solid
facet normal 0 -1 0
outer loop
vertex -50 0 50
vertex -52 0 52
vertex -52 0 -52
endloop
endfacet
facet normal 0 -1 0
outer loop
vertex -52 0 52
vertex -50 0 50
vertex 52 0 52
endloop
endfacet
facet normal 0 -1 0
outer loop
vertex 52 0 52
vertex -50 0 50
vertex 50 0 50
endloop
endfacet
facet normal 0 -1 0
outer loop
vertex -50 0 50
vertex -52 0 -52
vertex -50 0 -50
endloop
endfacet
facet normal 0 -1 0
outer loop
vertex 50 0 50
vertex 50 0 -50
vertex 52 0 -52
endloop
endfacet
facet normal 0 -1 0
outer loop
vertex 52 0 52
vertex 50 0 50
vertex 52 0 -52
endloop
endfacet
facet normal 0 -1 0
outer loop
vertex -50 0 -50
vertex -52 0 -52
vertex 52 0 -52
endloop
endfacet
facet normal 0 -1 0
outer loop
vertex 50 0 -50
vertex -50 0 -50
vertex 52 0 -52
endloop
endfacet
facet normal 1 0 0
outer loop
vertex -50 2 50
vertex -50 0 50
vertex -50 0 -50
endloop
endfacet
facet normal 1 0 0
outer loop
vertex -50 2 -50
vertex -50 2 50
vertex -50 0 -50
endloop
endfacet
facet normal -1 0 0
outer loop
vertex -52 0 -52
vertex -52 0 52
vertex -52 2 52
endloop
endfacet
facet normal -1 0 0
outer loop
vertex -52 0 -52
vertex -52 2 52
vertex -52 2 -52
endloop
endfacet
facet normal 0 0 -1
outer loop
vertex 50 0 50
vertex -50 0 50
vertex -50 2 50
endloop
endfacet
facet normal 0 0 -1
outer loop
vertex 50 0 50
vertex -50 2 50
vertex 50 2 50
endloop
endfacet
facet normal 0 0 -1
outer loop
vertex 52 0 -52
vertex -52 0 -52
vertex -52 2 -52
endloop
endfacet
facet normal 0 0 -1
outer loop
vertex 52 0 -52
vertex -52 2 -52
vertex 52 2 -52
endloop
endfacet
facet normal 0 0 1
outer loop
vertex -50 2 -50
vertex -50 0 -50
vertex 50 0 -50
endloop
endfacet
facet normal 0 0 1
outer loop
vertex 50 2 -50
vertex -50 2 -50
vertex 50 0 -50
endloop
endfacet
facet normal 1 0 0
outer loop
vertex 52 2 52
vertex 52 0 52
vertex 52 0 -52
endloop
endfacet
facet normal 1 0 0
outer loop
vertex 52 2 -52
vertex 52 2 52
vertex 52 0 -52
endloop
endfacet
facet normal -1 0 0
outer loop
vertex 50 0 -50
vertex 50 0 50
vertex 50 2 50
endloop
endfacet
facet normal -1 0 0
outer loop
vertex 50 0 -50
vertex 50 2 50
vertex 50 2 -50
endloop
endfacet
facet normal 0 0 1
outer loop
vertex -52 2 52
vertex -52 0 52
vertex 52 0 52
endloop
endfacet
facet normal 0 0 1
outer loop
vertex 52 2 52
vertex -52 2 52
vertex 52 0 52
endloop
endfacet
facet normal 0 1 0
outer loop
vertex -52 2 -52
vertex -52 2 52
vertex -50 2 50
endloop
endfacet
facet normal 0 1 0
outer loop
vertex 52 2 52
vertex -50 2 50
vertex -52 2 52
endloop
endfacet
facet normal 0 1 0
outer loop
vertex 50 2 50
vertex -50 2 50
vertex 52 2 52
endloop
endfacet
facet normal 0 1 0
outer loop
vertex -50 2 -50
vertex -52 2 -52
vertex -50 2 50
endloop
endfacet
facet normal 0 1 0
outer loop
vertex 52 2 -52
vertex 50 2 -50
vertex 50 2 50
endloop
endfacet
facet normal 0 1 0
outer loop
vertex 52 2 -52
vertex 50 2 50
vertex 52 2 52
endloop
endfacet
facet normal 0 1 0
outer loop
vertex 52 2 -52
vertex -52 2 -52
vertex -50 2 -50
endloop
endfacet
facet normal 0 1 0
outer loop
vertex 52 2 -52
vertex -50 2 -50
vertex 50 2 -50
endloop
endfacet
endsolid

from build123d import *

# Parameters (mm, degrees)
SKETCH1_W           = 104
SKETCH1_H           = 104
SKETCH1_W_2         = 100
SKETCH1_H_2         = 100
BOSS_EXTRUDE1_DEPTH = 2


with BuildPart() as part:
    # Sketch1 → Boss-Extrude1 (new body)
    with BuildSketch(Plane(origin=(0, 0, 0), x_dir=(1, 0, 0), z_dir=(0, 1, 0))):
        Rectangle(SKETCH1_W, SKETCH1_H)
        Rectangle(SKETCH1_W_2, SKETCH1_H_2, mode=Mode.SUBTRACT)
    extrude(amount=BOSS_EXTRUDE1_DEPTH)


solid = part.part
